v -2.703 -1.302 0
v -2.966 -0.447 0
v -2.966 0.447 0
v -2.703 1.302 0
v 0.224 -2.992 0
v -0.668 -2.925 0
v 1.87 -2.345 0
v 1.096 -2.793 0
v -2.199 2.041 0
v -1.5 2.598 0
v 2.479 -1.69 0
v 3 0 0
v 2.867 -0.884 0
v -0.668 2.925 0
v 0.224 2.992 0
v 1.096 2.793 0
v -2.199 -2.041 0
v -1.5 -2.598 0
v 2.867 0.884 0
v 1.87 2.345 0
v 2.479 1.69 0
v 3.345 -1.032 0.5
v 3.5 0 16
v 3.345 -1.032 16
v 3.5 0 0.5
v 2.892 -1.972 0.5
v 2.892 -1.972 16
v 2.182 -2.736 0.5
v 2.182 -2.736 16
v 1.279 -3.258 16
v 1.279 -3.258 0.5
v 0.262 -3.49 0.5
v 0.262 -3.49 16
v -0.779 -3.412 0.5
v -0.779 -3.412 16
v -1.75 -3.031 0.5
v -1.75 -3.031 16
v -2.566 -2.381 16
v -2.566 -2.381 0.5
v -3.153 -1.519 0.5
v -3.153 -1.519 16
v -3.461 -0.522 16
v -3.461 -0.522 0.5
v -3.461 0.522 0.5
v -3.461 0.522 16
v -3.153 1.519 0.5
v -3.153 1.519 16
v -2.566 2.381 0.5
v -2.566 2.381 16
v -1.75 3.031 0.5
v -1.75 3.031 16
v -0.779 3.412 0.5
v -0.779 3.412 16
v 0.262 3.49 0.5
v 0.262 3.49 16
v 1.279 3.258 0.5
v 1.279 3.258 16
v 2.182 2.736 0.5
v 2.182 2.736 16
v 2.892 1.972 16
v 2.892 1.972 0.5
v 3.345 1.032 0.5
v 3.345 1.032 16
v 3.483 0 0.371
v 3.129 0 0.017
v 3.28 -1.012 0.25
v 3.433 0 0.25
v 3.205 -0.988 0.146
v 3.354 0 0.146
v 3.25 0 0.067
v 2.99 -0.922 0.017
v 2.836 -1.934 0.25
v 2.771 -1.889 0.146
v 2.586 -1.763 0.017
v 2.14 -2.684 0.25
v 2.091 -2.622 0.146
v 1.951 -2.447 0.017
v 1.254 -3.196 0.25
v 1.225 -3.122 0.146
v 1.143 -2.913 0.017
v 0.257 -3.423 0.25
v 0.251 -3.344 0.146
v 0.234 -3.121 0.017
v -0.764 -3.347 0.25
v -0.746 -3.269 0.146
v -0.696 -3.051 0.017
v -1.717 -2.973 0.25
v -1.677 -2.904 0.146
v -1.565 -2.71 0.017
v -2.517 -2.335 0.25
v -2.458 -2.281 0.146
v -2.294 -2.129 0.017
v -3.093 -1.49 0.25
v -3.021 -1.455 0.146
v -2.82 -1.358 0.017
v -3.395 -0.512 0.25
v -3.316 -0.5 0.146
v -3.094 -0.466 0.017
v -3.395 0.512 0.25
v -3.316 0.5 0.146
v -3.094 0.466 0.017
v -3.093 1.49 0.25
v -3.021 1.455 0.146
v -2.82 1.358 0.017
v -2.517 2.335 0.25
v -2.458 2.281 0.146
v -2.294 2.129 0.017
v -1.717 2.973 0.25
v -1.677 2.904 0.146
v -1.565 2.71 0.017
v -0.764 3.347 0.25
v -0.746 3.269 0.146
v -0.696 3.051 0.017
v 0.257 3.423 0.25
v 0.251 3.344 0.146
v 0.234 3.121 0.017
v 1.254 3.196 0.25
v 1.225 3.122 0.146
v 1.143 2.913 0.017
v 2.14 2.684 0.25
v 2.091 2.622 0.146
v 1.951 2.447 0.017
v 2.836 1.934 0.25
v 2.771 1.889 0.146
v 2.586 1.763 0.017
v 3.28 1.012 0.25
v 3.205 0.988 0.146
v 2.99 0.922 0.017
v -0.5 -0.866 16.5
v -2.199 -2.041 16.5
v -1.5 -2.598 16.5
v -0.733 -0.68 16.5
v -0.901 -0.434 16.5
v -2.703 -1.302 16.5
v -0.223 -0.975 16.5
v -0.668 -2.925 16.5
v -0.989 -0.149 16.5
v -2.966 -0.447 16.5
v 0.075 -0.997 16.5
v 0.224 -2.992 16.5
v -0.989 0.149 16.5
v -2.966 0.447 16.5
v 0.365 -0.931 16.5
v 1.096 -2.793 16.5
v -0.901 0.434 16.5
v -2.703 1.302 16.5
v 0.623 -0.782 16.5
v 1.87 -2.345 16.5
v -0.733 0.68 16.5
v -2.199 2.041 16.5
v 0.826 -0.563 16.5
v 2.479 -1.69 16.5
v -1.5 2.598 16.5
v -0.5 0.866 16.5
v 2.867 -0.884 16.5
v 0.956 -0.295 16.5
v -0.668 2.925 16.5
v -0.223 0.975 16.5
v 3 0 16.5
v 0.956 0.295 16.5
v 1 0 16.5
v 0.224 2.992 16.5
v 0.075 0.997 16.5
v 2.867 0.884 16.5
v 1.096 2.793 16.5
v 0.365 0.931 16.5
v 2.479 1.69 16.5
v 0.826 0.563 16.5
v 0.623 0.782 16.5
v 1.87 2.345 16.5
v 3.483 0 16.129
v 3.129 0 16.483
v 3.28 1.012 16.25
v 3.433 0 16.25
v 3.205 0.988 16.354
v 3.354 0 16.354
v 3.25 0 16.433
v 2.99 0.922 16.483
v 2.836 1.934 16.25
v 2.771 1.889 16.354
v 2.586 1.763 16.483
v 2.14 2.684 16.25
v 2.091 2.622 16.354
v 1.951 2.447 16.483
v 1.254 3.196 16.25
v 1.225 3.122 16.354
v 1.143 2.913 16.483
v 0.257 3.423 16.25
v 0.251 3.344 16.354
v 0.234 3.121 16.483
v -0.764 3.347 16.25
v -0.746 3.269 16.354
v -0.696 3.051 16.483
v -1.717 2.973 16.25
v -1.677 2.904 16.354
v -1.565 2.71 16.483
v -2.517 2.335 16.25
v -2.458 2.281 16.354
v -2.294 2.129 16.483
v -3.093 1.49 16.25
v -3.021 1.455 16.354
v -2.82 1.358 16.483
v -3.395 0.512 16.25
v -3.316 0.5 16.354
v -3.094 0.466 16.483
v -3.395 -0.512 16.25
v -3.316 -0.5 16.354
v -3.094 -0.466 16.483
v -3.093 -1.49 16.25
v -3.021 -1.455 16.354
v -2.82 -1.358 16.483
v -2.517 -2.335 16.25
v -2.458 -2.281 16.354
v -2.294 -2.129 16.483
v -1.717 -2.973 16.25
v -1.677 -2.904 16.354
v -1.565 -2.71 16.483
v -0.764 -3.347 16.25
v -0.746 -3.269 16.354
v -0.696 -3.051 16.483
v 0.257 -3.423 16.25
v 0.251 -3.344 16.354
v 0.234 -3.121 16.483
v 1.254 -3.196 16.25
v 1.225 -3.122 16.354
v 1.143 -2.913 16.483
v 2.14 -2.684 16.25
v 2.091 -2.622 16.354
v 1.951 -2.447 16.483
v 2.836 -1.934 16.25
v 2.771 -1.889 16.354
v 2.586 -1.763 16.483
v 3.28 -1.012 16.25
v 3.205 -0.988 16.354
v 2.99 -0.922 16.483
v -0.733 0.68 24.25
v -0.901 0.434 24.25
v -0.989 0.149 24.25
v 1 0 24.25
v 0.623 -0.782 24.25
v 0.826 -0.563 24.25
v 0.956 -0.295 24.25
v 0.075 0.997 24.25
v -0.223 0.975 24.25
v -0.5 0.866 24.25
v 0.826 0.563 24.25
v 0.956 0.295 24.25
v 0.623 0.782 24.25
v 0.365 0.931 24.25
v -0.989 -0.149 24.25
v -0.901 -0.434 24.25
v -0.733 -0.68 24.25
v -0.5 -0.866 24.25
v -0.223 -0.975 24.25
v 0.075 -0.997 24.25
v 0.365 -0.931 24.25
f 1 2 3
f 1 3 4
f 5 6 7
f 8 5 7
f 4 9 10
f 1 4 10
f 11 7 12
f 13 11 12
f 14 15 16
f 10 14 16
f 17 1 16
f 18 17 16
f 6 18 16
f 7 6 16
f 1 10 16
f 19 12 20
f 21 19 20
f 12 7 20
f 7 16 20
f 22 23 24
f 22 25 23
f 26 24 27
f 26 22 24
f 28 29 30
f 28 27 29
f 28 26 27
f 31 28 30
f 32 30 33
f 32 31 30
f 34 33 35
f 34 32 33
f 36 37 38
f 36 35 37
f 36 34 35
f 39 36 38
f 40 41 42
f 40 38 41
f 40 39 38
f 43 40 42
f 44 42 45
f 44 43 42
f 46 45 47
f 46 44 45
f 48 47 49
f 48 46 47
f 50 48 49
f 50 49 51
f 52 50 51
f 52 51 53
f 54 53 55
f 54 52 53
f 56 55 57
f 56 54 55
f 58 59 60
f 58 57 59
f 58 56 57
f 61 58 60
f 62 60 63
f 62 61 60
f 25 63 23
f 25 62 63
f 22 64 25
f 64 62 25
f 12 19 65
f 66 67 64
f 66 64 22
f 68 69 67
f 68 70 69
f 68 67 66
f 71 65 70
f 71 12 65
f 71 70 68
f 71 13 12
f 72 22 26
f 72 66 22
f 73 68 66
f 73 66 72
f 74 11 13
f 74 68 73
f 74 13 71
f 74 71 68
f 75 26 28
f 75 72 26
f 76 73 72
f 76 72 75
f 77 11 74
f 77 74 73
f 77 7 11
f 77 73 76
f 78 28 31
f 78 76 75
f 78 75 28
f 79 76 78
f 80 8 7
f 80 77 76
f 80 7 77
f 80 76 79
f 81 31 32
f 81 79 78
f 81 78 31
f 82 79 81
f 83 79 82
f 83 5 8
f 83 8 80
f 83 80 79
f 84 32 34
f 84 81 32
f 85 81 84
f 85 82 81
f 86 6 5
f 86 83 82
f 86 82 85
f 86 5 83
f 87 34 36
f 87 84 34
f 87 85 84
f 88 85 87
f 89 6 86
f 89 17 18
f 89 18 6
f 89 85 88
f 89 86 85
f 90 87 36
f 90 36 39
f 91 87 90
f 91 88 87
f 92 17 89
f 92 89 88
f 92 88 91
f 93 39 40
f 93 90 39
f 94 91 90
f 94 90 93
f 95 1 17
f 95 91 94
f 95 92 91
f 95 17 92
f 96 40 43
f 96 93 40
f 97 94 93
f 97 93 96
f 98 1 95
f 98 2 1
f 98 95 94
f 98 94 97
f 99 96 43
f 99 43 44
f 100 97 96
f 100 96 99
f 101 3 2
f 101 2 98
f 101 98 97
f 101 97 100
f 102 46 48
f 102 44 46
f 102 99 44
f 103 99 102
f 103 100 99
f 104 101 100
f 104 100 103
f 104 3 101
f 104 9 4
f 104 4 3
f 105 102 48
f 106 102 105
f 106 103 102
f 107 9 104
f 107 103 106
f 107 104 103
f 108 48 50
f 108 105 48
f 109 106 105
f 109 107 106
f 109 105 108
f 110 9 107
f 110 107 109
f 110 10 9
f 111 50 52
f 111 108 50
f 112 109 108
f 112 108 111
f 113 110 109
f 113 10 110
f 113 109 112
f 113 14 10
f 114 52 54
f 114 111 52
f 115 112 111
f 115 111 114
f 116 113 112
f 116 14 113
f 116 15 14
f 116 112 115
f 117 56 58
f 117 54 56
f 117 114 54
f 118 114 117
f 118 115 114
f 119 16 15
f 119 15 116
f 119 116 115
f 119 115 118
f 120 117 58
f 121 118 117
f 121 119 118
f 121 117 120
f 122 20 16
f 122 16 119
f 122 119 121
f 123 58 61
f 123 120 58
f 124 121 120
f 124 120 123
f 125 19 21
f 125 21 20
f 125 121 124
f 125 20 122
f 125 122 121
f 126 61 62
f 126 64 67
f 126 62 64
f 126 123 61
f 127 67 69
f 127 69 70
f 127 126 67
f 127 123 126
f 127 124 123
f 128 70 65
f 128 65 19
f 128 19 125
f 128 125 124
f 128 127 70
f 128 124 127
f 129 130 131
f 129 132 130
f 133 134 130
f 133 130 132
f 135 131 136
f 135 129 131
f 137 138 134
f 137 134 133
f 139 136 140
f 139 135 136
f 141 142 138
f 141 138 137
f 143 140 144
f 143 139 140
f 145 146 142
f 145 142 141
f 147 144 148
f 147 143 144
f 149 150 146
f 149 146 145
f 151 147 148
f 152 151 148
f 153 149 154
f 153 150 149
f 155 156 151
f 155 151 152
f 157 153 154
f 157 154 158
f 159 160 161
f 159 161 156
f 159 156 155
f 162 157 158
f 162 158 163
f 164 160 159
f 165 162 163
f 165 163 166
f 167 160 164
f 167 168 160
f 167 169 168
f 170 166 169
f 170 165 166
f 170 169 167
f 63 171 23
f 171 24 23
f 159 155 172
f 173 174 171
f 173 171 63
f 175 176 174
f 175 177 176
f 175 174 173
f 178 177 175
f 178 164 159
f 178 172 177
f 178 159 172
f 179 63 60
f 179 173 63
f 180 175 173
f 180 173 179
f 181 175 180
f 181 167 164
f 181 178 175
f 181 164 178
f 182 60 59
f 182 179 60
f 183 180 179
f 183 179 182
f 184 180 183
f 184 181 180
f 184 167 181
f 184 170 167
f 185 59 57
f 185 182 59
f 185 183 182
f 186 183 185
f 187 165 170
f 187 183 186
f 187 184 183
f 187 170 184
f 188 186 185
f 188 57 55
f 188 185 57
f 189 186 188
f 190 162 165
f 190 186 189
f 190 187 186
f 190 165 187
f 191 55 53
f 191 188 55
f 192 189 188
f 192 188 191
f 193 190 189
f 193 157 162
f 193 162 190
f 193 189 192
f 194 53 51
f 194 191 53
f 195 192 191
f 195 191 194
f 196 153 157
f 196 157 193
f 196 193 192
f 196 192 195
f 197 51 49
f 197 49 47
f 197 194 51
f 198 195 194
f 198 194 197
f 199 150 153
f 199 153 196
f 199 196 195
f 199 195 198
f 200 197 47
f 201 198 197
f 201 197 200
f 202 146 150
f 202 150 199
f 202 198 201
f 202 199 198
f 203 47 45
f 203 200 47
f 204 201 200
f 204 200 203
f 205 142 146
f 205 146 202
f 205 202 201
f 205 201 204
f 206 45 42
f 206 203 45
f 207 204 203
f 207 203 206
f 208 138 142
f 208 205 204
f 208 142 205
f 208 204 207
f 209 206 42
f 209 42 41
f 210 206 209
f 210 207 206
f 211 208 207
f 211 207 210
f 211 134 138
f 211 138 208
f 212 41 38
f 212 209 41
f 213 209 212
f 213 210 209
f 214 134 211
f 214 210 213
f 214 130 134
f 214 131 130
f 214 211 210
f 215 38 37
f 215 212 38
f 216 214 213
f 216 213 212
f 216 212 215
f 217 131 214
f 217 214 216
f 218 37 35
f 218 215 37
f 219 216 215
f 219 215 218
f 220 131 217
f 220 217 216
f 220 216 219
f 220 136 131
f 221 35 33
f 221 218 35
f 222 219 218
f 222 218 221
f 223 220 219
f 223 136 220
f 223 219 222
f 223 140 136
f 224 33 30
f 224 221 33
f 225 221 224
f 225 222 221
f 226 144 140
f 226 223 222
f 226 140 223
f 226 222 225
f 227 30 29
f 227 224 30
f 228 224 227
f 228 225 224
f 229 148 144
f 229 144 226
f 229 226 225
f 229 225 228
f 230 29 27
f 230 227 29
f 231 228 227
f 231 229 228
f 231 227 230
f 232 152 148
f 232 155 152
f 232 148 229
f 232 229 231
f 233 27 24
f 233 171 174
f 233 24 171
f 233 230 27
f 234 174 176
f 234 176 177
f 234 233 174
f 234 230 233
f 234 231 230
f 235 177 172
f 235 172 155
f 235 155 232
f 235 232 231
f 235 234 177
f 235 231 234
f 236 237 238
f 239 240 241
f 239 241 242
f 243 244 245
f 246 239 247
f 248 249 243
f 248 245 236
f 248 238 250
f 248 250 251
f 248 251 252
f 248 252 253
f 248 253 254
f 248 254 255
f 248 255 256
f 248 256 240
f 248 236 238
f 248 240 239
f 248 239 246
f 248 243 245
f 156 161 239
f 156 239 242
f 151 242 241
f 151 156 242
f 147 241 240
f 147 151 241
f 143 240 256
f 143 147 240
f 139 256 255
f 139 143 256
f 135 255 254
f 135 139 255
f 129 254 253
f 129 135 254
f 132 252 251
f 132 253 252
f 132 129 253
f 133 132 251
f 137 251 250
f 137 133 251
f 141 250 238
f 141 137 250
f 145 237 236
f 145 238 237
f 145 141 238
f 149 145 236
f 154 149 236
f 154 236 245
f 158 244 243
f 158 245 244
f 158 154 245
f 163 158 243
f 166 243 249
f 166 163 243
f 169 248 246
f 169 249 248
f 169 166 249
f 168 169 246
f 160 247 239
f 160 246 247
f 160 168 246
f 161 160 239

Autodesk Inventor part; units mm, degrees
ref_plane "YZ Plane" through (0, 0, 0) normal (1, 0, 0) x (0, 1, 0)
ref_plane "XZ Plane" through (0, 0, 0) normal (0, 1, 0) x (-1, 0, 0)
ref_plane "XY Plane" through (0, 0, 0) normal (0, 0, 1) x (1, 0, 0)
sketch "Skizze1" plane through (0, 0, 0) normal (0, 0, 1) x (1, 0, 0)
  circle A0 centre (0, 0) radius 3.5
  dimension "d0" = 7
extrude "Extrusion1" add sketch "Skizze1" along normal blind 16.5
sketch "Skizze2" plane through (0, 0, 16.5) normal (0, 0, 1) x (1, 0, 0)
  circle A0 centre (0, 0) radius 1
  dimension "d3" = 2
extrude "Extrusion2" add sketch "Skizze2" along normal blind 7.75
fillet "Rundung1" radius 0.5 2 edges at (-3.5, 0, 16.5) (-3.5, 0, 0)
properties part number "P_Motor"
